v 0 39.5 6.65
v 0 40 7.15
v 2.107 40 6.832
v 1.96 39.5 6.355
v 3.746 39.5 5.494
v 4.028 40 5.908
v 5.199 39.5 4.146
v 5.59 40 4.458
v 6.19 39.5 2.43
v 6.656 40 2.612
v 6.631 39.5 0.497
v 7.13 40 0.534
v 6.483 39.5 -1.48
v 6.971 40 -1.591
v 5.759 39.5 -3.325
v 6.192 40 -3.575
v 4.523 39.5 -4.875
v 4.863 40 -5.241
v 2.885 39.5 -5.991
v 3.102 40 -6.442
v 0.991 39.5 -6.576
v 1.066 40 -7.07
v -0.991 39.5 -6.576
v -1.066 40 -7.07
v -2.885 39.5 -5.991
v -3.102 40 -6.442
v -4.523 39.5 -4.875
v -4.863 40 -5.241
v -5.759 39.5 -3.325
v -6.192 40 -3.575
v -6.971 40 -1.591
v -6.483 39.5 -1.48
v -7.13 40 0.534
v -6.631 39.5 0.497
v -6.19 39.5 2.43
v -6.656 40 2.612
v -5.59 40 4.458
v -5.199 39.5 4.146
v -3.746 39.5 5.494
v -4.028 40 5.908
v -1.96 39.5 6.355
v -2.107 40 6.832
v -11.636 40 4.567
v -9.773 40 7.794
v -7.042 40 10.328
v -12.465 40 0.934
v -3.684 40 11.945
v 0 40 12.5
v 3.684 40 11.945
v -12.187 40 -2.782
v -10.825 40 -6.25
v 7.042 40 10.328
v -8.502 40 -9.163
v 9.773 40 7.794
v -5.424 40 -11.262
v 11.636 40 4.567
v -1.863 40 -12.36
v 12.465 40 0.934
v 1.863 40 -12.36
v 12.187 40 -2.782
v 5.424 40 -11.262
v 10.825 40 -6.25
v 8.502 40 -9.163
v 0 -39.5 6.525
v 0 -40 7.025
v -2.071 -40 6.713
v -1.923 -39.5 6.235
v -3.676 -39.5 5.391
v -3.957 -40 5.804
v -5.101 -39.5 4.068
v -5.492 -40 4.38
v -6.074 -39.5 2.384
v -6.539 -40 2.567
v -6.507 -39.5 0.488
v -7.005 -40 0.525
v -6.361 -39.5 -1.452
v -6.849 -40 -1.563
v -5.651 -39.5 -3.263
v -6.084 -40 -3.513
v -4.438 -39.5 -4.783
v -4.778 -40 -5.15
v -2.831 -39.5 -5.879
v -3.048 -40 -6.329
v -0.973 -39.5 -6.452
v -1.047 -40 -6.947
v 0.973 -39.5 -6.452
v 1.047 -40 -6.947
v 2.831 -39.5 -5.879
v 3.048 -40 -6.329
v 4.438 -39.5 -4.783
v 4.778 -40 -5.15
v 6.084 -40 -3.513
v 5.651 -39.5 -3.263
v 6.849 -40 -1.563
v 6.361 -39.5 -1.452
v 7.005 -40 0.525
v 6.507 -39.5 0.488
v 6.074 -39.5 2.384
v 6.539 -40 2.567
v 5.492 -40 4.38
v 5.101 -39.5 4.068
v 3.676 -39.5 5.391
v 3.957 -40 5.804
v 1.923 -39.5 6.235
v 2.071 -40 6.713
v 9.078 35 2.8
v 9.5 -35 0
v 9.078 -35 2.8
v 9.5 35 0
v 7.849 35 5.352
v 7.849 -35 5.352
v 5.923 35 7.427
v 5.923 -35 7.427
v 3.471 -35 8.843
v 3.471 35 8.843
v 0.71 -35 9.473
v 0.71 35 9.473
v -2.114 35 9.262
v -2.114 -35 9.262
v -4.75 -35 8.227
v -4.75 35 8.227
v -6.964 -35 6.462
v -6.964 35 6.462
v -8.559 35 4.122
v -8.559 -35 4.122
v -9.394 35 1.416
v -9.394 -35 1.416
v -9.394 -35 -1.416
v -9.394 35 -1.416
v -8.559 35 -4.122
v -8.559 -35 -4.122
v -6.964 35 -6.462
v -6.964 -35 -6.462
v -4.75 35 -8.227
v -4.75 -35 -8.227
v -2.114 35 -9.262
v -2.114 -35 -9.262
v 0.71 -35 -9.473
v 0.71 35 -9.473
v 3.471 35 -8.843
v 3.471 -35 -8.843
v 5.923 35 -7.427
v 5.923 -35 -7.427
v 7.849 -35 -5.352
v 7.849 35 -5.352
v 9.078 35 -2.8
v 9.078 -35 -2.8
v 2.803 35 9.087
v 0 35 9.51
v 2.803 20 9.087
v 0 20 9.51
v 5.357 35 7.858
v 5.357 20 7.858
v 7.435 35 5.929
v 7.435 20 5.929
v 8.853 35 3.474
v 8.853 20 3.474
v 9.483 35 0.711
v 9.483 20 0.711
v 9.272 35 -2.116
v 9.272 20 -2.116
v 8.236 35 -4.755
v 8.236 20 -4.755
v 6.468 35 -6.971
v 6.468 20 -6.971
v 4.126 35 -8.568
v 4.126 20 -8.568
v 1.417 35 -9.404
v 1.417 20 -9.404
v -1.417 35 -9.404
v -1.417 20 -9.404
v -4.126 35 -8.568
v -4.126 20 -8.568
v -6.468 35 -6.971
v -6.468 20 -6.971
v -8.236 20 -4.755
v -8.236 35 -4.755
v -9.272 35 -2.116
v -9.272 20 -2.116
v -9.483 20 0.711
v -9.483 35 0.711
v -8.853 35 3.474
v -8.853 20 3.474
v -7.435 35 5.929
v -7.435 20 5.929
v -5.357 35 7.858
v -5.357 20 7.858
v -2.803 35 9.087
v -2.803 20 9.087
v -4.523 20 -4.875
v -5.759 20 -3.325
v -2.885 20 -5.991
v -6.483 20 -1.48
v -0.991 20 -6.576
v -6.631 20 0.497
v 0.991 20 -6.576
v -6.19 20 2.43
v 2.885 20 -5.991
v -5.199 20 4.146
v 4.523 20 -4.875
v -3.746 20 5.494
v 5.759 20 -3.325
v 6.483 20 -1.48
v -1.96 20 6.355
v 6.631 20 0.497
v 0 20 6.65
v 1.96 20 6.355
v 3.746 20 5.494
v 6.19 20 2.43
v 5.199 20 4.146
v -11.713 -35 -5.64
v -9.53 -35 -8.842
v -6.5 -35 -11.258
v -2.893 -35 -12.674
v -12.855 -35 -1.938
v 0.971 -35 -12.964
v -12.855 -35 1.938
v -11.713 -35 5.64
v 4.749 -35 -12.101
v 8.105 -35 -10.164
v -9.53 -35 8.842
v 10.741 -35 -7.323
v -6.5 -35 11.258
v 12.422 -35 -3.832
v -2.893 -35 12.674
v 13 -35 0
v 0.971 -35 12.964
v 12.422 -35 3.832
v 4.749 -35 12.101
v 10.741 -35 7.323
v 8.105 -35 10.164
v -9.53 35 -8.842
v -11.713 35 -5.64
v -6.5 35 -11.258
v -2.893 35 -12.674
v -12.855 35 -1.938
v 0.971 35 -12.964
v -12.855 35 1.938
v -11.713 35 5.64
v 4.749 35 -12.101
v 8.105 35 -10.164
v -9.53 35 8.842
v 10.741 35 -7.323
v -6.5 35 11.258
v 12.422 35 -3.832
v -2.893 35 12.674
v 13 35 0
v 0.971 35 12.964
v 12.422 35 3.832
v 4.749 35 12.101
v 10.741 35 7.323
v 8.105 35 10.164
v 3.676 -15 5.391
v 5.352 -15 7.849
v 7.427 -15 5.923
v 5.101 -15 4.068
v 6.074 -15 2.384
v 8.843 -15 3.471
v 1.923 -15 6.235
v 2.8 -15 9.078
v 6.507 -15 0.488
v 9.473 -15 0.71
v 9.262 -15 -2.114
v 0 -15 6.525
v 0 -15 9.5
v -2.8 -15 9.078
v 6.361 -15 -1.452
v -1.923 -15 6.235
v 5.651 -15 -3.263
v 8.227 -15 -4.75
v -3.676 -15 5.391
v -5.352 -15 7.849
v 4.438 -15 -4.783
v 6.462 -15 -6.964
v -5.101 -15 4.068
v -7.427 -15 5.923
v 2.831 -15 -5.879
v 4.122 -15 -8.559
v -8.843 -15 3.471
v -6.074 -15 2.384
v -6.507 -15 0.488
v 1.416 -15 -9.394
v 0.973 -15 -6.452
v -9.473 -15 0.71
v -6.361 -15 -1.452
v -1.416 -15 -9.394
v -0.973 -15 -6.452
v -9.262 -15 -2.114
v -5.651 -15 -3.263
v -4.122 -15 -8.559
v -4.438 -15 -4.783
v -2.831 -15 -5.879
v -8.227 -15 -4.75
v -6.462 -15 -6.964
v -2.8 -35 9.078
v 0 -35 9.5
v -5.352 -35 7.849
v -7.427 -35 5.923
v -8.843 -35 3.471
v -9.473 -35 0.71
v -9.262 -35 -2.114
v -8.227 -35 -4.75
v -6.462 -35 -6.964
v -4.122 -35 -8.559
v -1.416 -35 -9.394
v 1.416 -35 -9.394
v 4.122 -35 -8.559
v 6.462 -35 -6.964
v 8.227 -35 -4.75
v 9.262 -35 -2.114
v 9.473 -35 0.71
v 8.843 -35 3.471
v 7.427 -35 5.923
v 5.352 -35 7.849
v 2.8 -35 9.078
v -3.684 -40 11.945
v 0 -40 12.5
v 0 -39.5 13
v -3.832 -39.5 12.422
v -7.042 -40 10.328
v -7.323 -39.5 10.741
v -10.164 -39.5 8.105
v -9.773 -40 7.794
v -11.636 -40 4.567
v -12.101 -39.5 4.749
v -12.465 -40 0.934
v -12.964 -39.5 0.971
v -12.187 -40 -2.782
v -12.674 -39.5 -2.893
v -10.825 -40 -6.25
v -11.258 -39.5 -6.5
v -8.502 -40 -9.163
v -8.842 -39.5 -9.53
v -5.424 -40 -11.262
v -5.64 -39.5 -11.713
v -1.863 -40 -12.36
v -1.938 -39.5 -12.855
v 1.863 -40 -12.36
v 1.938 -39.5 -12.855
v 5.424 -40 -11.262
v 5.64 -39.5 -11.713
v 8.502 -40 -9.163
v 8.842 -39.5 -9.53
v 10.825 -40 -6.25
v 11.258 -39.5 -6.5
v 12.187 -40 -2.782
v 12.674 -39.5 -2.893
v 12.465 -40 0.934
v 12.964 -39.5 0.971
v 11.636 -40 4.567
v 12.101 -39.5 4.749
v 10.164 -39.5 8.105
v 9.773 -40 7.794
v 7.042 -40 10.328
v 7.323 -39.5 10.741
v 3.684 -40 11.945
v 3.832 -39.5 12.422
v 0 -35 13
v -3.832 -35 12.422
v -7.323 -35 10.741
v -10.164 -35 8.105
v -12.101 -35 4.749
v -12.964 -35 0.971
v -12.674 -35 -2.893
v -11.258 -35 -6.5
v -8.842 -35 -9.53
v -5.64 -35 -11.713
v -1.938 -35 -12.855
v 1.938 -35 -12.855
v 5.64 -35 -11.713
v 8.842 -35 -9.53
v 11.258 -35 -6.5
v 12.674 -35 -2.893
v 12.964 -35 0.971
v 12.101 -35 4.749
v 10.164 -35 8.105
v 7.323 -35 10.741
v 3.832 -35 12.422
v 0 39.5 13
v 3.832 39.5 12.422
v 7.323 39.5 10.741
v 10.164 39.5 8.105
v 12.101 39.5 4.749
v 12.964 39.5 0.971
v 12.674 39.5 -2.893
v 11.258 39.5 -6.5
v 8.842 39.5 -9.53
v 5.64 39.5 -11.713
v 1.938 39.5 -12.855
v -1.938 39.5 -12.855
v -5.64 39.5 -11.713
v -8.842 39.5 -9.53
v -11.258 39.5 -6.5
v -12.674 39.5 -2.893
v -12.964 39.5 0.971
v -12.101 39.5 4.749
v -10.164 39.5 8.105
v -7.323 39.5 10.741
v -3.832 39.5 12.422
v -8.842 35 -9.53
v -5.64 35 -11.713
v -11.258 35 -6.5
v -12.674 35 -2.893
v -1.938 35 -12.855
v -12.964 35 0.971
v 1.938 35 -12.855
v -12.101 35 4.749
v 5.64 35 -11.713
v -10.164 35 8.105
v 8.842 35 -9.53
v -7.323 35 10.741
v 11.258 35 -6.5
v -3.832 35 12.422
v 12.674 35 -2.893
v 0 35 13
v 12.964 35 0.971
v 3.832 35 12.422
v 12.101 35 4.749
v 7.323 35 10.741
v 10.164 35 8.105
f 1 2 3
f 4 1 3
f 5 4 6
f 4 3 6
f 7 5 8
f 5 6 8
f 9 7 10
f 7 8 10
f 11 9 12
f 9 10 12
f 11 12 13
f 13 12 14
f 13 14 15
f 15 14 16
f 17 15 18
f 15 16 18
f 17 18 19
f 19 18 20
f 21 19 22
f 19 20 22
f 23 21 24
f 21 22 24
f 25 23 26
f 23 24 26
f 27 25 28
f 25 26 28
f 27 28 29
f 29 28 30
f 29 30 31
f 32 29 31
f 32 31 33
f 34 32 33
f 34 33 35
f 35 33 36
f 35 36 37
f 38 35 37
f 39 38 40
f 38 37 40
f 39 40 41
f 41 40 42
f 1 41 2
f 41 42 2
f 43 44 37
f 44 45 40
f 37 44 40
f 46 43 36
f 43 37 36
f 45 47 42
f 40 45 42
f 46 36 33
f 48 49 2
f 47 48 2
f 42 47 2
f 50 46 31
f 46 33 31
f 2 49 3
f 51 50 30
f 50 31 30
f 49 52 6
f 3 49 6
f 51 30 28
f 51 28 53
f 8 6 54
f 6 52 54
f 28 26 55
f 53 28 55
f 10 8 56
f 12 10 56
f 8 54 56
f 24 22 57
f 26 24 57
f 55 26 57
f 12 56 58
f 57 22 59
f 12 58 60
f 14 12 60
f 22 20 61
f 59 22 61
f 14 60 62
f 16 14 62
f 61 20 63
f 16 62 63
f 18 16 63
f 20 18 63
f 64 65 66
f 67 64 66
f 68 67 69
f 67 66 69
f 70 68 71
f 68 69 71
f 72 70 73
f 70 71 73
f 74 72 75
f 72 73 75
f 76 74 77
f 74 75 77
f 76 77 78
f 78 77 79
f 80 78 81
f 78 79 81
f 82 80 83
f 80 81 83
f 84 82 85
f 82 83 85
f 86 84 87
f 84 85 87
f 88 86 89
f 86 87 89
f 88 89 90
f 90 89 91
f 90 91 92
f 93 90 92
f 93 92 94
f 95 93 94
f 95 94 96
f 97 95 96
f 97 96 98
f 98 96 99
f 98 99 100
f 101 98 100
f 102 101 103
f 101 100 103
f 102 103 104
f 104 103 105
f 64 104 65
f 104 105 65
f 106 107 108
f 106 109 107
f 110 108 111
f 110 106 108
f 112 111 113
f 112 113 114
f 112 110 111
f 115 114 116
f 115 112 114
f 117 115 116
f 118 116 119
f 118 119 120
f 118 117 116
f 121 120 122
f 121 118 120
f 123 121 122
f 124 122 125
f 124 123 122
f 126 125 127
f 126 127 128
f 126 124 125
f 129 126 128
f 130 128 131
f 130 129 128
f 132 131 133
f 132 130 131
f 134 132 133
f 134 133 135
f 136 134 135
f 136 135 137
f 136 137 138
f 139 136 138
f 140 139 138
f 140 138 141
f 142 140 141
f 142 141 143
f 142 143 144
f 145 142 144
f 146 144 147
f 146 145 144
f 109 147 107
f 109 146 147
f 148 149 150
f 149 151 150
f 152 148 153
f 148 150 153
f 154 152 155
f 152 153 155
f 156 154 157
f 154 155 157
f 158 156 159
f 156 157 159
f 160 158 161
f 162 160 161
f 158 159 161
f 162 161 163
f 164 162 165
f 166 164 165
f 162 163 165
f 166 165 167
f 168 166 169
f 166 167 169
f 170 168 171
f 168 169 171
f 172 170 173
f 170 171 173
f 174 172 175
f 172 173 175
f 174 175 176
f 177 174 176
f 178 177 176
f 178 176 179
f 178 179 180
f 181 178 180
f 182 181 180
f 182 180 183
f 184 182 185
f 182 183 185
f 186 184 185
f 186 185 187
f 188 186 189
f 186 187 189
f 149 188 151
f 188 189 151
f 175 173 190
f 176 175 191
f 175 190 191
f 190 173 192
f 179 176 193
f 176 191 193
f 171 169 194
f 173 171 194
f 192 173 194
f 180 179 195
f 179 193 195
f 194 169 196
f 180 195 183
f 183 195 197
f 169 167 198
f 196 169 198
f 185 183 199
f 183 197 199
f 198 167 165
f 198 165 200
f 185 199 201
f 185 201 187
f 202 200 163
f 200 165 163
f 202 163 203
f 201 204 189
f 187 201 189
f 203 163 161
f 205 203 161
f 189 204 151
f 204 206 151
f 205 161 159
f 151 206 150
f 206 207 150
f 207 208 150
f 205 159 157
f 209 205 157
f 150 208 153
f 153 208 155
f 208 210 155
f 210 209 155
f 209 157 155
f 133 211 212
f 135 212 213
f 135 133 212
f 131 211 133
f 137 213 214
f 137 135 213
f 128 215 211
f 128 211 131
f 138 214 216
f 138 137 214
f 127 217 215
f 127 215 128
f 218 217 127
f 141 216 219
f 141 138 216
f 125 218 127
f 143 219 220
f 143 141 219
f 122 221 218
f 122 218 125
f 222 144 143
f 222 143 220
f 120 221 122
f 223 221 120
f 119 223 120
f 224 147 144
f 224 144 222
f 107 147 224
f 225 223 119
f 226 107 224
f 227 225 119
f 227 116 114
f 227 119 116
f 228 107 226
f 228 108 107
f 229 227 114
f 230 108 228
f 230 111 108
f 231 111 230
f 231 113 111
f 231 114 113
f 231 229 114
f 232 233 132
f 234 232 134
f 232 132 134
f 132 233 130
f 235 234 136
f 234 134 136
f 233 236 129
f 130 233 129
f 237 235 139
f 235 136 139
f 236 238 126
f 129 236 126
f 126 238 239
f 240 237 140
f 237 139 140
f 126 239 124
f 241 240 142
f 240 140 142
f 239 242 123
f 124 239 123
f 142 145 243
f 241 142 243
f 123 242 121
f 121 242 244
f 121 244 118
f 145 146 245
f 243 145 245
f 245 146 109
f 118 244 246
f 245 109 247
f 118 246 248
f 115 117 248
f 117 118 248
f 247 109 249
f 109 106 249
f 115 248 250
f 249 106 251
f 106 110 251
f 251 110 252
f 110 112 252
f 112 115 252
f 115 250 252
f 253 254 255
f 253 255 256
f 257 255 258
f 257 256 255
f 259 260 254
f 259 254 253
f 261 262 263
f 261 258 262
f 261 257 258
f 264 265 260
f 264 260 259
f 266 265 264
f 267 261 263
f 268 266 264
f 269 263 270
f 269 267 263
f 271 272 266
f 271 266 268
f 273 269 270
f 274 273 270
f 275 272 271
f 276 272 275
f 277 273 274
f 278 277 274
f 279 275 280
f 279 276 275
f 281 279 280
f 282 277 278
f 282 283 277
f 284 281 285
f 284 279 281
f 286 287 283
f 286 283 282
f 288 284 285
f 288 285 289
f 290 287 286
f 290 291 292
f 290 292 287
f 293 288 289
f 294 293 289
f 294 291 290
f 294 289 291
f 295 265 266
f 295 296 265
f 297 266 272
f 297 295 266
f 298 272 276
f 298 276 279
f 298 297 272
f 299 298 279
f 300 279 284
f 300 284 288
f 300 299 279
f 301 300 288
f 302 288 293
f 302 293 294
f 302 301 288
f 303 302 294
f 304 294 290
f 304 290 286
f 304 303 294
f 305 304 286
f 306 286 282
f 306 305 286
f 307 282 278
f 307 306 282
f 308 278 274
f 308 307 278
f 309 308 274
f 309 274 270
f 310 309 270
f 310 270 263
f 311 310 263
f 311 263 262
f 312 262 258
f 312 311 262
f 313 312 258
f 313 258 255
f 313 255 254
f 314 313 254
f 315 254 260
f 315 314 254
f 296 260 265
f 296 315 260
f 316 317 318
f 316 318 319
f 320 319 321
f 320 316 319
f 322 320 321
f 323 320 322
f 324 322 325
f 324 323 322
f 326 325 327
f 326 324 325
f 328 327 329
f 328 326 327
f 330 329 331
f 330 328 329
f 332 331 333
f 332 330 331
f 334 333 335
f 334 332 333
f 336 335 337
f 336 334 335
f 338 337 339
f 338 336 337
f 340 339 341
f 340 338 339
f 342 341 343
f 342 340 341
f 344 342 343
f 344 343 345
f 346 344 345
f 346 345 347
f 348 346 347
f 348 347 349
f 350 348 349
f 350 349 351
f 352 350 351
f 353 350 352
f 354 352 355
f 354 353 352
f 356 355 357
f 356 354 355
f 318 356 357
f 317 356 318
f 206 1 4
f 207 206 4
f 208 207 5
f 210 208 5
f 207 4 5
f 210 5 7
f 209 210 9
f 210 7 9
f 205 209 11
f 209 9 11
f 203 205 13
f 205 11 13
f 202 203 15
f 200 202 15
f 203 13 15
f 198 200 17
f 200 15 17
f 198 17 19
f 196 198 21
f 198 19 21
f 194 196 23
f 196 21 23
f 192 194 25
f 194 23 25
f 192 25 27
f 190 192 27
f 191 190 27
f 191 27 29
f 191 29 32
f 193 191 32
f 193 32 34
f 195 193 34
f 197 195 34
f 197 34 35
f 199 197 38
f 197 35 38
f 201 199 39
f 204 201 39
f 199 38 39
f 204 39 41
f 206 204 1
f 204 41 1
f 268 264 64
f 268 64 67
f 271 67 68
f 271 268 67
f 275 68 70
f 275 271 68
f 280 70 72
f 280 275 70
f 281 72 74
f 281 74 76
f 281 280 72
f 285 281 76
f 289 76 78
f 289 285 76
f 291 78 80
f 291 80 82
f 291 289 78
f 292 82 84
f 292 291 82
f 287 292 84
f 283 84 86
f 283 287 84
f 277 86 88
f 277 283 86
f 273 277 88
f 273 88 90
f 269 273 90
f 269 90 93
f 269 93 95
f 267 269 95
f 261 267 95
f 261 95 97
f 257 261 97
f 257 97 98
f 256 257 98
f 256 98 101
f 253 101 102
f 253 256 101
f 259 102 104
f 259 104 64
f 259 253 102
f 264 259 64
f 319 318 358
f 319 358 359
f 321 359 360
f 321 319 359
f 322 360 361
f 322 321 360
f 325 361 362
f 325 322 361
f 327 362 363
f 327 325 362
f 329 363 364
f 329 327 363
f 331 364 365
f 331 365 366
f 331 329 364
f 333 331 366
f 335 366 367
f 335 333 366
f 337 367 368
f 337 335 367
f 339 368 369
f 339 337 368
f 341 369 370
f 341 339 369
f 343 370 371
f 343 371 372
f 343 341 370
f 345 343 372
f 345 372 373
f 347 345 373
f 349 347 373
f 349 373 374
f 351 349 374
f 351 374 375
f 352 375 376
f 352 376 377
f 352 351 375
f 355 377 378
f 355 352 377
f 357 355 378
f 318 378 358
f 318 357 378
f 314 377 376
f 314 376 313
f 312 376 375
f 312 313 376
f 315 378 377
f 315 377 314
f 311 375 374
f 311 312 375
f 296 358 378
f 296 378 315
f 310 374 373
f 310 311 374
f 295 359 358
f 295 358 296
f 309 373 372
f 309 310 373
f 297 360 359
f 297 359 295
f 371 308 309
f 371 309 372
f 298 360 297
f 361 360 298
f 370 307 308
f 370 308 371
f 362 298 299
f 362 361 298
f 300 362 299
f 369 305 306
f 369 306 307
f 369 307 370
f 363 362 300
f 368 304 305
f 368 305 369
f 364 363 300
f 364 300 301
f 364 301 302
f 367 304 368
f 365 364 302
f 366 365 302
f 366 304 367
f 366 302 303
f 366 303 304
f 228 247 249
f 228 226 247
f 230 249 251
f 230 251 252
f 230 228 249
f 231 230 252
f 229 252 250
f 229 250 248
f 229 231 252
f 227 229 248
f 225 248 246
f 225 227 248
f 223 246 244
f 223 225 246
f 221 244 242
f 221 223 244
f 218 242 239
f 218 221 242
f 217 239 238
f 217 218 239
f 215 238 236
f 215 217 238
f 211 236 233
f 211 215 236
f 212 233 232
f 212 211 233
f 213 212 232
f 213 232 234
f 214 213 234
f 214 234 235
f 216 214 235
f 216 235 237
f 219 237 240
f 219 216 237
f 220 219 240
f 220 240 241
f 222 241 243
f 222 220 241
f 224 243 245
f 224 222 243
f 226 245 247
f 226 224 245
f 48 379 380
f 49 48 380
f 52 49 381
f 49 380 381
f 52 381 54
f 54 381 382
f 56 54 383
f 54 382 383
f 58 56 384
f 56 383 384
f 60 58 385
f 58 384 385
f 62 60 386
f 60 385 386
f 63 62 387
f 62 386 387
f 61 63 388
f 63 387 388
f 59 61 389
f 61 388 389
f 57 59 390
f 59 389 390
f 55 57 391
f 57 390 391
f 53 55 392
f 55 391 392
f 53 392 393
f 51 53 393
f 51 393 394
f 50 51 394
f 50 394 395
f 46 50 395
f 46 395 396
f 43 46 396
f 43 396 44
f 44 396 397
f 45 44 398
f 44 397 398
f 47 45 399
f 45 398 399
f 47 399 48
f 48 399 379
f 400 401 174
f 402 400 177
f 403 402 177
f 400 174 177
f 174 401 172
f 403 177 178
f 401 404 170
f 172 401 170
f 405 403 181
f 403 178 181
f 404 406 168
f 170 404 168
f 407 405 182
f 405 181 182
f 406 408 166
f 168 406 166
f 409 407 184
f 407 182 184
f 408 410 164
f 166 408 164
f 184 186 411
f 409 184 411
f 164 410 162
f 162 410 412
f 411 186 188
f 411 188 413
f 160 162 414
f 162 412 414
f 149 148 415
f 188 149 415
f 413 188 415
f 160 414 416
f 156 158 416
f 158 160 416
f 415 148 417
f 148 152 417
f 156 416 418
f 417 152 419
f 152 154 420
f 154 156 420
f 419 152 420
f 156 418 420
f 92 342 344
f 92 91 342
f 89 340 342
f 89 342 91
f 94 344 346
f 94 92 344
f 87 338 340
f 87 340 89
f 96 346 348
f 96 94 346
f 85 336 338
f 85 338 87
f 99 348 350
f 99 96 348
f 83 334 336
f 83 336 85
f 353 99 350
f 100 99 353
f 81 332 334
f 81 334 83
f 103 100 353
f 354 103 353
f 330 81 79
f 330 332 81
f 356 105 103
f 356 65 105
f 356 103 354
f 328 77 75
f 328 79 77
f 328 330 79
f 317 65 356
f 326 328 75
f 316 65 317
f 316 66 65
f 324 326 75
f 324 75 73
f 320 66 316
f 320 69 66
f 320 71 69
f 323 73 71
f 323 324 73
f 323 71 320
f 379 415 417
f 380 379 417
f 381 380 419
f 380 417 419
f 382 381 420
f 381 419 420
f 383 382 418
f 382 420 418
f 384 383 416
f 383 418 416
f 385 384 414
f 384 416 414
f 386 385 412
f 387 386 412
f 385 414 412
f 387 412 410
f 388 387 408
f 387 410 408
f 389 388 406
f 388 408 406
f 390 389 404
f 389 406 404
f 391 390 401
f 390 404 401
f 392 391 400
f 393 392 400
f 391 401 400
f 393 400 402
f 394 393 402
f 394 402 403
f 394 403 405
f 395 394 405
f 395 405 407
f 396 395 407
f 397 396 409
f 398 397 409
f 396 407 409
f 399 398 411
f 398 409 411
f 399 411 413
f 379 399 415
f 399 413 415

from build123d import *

# Parameters (mm, degrees)
F0_R      = 13
F0_R_2    = 9.5
F1_DEPTH  = 35
F6_SIZE   = 0.5
F6_2_SIZE = 0.5


with BuildPart() as f1:
    # F0 (on Front) → F1 (new body, symmetric)
    with BuildSketch(Plane.XZ):
        Circle(F0_R)
        Circle(F0_R_2, mode=Mode.SUBTRACT)
    extrude(amount=F1_DEPTH, both=True)


with BuildPart() as f3:
    # F2 (on Right) → F3 (revolve)
    with BuildSketch(Plane.YZ):
        Polygon((-40, 6.525), (-15, 6.525), (-15, 9.5), (-35, 9.5), (-35, 13), (-40, 13), align=None)
    revolve(axis=Axis((0, -23.343612, 0), (0, -1, 0)))

    # F6#2
    f6_2_edges = [f3.edges().sort_by_distance(p)[0] for p in [
        (0, -40, -13),
        (0, -40, -6.525),
    ]]
    chamfer(f6_2_edges, length=F6_2_SIZE)


with BuildPart() as f5:
    # F4 (on Right) → F5 (revolve)
    with BuildSketch(Plane.YZ):
        Polygon((35, 9.51), (20, 9.51), (20, 6.65), (40, 6.65), (40, 13), (35, 13), align=None)
    revolve(axis=Axis((0, 24.280891, 0), (0, 1, 0)))

    # F6
    f6_edges = [f5.edges().sort_by_distance(p)[0] for p in [
        (0, 40, -6.65),
        (0, 40, -13),
    ]]
    chamfer(f6_edges, length=F6_SIZE)


solid = Compound([f1.part, f3.part, f5.part])
